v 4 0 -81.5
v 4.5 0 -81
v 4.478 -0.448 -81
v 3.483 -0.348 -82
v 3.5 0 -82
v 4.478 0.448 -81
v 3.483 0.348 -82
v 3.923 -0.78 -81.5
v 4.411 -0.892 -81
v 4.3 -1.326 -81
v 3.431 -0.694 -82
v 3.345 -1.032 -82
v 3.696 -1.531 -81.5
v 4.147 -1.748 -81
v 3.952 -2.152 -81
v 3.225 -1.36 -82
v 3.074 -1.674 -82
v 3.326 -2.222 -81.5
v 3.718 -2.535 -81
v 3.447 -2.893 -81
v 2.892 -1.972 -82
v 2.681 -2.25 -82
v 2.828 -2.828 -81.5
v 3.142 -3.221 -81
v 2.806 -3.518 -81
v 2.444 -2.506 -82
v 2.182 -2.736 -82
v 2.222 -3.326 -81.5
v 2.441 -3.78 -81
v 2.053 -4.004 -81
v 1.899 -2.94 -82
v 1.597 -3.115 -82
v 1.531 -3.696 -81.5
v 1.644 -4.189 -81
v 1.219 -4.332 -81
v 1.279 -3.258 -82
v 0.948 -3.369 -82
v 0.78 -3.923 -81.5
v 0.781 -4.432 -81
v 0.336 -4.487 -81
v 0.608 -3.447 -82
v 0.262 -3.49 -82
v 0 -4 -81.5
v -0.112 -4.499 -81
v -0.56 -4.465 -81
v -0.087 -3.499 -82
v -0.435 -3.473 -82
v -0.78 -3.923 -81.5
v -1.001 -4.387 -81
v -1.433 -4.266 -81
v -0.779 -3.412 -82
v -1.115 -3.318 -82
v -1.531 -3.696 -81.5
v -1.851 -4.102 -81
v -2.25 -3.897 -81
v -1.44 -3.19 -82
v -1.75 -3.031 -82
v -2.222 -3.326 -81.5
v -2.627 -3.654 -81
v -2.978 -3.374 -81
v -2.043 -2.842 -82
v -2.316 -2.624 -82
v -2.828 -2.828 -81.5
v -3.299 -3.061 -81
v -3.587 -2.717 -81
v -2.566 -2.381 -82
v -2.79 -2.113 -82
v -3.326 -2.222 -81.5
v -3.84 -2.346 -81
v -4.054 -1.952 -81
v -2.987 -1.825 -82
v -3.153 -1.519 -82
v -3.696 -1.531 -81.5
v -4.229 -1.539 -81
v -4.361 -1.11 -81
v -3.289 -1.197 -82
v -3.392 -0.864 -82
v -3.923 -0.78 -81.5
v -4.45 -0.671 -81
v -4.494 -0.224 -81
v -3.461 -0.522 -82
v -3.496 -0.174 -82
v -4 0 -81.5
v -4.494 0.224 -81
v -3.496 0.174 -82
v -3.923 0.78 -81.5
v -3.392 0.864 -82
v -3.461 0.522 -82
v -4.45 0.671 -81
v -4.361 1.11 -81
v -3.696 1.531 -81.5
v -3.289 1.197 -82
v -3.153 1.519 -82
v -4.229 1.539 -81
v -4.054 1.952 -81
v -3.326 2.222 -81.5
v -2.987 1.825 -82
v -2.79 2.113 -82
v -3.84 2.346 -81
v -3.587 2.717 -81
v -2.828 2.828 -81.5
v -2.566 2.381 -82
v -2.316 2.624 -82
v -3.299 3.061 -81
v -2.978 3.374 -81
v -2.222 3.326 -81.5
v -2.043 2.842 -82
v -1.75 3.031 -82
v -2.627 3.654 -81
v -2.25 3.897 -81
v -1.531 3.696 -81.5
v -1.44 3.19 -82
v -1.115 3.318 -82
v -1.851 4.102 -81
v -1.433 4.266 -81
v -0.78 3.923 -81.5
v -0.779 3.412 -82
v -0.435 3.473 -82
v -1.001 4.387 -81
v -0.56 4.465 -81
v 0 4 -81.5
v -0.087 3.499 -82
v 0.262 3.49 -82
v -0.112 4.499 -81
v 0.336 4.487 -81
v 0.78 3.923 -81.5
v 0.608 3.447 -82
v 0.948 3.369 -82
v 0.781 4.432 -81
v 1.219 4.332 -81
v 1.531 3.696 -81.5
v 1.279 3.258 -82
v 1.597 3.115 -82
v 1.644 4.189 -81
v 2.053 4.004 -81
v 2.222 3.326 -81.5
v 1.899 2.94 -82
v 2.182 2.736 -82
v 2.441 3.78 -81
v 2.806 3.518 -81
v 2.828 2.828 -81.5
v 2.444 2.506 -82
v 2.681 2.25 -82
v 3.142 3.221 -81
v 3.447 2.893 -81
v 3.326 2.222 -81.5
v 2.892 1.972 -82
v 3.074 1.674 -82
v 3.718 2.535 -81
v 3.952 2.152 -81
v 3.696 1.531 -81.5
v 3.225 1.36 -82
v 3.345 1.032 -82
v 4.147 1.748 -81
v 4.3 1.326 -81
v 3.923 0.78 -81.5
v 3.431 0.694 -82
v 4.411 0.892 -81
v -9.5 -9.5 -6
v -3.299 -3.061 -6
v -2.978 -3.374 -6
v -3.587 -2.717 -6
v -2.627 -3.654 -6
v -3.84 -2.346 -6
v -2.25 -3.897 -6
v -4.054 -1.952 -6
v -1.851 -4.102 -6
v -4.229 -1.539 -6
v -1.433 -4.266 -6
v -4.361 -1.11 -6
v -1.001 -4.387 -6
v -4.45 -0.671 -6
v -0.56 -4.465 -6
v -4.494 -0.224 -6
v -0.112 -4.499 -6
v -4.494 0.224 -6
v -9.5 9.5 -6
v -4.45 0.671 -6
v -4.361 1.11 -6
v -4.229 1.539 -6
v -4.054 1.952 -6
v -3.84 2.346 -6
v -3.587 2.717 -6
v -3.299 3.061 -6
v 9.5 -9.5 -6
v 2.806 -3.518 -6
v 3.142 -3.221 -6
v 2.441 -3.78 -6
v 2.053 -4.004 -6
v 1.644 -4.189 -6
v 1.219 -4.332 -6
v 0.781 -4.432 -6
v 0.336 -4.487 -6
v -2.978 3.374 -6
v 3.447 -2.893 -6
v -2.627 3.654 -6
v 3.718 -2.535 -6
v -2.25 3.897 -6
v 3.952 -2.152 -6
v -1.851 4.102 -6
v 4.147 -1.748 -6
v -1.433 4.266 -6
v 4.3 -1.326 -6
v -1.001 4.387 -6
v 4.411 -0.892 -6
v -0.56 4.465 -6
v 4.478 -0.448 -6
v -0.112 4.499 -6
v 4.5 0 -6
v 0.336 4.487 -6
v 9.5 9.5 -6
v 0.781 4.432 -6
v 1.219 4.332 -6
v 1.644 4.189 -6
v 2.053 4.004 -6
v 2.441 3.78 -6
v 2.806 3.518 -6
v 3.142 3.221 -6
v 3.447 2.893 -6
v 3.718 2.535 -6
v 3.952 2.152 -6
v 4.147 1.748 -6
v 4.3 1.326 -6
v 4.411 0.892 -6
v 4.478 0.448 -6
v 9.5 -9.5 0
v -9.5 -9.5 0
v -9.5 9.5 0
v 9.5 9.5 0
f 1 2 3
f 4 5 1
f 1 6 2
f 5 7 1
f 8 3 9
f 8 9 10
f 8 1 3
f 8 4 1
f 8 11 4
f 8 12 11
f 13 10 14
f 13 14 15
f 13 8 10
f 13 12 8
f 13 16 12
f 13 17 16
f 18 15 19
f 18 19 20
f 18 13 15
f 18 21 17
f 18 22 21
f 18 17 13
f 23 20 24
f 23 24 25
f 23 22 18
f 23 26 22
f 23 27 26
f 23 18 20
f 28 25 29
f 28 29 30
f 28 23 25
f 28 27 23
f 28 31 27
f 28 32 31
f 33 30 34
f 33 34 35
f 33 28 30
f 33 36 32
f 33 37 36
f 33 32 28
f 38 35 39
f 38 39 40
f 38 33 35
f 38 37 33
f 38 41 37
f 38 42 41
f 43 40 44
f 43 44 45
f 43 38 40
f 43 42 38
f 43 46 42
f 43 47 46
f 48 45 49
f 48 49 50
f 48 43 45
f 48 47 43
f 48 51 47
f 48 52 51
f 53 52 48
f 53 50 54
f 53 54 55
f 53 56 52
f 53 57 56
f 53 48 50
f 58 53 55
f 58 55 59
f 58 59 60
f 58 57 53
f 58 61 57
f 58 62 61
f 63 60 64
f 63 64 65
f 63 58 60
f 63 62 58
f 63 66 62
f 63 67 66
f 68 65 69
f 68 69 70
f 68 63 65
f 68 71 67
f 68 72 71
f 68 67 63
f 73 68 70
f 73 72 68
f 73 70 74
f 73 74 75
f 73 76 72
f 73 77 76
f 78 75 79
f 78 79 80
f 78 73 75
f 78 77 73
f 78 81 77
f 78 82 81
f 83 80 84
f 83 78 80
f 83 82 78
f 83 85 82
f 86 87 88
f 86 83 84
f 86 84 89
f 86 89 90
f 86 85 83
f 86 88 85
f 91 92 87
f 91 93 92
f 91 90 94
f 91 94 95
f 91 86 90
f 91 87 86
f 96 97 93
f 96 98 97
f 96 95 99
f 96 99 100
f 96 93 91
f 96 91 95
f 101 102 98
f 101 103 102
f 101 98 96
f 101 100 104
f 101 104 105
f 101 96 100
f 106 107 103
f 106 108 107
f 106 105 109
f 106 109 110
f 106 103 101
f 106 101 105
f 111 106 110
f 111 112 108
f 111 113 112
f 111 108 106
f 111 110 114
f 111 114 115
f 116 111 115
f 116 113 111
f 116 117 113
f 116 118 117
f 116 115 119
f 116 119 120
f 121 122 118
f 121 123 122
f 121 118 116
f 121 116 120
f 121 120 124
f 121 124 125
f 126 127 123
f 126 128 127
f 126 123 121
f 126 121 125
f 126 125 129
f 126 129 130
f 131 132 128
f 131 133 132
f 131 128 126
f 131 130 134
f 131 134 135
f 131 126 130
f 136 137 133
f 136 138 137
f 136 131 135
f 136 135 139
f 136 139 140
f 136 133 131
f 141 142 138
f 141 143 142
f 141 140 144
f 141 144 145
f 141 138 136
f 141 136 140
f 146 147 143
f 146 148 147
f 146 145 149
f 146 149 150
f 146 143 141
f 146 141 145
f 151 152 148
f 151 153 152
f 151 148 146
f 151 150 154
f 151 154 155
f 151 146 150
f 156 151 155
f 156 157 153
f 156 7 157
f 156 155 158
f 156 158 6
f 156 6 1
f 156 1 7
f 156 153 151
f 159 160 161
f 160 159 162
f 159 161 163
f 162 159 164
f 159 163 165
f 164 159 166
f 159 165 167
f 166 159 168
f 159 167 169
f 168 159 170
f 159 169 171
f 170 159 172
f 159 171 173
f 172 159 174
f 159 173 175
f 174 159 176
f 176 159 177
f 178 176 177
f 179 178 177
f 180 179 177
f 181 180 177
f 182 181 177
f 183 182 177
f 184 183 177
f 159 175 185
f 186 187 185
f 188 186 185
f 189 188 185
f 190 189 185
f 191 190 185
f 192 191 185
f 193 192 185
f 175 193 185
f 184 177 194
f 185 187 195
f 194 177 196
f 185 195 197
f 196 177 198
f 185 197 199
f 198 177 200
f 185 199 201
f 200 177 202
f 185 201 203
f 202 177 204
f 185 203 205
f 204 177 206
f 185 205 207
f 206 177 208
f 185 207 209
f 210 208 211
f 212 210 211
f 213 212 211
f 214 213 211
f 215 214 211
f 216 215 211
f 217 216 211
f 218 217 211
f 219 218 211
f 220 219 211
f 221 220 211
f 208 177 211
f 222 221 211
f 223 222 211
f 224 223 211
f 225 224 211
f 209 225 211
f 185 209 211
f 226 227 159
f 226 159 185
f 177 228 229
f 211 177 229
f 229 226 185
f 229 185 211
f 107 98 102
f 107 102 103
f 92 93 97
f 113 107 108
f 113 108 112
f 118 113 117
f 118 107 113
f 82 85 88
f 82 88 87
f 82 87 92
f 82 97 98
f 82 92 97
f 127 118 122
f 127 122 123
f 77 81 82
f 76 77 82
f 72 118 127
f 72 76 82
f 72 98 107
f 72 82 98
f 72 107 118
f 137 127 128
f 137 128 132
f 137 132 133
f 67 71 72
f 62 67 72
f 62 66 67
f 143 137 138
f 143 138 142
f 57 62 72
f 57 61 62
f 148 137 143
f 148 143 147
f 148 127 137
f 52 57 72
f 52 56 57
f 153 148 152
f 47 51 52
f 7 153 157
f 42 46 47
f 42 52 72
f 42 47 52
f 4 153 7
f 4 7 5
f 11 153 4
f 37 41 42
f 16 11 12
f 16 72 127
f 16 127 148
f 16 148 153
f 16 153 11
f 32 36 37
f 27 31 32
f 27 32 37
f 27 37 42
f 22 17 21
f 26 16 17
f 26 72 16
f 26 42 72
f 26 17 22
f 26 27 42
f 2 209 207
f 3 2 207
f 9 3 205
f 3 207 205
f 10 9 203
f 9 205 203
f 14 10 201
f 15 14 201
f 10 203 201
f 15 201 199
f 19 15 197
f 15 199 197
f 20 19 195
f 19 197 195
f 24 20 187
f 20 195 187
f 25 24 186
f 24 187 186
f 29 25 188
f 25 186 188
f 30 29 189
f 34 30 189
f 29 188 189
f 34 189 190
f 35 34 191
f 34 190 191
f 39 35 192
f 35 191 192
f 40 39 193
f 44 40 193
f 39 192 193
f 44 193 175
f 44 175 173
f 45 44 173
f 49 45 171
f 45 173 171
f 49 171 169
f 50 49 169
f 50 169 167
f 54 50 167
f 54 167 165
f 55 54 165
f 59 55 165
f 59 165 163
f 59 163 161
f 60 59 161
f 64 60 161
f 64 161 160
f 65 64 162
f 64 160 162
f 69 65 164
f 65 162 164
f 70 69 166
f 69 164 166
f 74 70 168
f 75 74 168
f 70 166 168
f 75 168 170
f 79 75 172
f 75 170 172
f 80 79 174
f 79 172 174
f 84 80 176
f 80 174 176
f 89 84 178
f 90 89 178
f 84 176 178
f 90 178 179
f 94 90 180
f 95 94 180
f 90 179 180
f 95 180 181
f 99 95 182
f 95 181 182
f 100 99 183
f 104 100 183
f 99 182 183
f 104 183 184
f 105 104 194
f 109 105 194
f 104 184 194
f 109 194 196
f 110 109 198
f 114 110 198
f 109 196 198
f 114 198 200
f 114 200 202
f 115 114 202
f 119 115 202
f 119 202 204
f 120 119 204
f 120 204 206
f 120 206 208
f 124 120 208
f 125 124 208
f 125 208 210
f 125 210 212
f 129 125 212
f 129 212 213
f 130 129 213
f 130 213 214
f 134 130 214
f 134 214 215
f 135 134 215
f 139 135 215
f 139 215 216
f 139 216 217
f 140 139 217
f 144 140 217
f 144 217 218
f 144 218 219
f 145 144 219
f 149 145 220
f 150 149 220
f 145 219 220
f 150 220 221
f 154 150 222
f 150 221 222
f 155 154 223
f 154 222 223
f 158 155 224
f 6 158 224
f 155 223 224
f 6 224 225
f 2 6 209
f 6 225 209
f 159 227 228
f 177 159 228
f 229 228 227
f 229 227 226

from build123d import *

# Parameters (mm, degrees)
SKETCH1_W           = 19
SKETCH1_H           = 19
BOSS_EXTRUDE1_DEPTH = 6
SKETCH2_R           = 4.5
BOSS_EXTRUDE2_DEPTH = 76
CHAMFER1_SIZE       = 1


with BuildPart() as part:
    # Sketch1 → Boss-Extrude1 (new body)
    with BuildSketch(Plane.XY):
        Rectangle(SKETCH1_W, SKETCH1_H)
    extrude(amount=-BOSS_EXTRUDE1_DEPTH)

    # Sketch2 → Boss-Extrude2 (add)
    with BuildSketch(Plane(origin=(0, 0, -6), x_dir=(-1, 0, 0), z_dir=(0, 0, -1))):
        with Locations(Location((0, 0, 0), (0, 0, 180))):  # turned: the seam where the file's is
            Circle(SKETCH2_R)
    extrude(amount=BOSS_EXTRUDE2_DEPTH)

    # Chamfer1
    chamfer1_edges = [part.edges().sort_by_distance(p)[0] for p in [
        (-4.5, 0, -82),
    ]]
    chamfer(chamfer1_edges, length=CHAMFER1_SIZE)


solid = part.part
